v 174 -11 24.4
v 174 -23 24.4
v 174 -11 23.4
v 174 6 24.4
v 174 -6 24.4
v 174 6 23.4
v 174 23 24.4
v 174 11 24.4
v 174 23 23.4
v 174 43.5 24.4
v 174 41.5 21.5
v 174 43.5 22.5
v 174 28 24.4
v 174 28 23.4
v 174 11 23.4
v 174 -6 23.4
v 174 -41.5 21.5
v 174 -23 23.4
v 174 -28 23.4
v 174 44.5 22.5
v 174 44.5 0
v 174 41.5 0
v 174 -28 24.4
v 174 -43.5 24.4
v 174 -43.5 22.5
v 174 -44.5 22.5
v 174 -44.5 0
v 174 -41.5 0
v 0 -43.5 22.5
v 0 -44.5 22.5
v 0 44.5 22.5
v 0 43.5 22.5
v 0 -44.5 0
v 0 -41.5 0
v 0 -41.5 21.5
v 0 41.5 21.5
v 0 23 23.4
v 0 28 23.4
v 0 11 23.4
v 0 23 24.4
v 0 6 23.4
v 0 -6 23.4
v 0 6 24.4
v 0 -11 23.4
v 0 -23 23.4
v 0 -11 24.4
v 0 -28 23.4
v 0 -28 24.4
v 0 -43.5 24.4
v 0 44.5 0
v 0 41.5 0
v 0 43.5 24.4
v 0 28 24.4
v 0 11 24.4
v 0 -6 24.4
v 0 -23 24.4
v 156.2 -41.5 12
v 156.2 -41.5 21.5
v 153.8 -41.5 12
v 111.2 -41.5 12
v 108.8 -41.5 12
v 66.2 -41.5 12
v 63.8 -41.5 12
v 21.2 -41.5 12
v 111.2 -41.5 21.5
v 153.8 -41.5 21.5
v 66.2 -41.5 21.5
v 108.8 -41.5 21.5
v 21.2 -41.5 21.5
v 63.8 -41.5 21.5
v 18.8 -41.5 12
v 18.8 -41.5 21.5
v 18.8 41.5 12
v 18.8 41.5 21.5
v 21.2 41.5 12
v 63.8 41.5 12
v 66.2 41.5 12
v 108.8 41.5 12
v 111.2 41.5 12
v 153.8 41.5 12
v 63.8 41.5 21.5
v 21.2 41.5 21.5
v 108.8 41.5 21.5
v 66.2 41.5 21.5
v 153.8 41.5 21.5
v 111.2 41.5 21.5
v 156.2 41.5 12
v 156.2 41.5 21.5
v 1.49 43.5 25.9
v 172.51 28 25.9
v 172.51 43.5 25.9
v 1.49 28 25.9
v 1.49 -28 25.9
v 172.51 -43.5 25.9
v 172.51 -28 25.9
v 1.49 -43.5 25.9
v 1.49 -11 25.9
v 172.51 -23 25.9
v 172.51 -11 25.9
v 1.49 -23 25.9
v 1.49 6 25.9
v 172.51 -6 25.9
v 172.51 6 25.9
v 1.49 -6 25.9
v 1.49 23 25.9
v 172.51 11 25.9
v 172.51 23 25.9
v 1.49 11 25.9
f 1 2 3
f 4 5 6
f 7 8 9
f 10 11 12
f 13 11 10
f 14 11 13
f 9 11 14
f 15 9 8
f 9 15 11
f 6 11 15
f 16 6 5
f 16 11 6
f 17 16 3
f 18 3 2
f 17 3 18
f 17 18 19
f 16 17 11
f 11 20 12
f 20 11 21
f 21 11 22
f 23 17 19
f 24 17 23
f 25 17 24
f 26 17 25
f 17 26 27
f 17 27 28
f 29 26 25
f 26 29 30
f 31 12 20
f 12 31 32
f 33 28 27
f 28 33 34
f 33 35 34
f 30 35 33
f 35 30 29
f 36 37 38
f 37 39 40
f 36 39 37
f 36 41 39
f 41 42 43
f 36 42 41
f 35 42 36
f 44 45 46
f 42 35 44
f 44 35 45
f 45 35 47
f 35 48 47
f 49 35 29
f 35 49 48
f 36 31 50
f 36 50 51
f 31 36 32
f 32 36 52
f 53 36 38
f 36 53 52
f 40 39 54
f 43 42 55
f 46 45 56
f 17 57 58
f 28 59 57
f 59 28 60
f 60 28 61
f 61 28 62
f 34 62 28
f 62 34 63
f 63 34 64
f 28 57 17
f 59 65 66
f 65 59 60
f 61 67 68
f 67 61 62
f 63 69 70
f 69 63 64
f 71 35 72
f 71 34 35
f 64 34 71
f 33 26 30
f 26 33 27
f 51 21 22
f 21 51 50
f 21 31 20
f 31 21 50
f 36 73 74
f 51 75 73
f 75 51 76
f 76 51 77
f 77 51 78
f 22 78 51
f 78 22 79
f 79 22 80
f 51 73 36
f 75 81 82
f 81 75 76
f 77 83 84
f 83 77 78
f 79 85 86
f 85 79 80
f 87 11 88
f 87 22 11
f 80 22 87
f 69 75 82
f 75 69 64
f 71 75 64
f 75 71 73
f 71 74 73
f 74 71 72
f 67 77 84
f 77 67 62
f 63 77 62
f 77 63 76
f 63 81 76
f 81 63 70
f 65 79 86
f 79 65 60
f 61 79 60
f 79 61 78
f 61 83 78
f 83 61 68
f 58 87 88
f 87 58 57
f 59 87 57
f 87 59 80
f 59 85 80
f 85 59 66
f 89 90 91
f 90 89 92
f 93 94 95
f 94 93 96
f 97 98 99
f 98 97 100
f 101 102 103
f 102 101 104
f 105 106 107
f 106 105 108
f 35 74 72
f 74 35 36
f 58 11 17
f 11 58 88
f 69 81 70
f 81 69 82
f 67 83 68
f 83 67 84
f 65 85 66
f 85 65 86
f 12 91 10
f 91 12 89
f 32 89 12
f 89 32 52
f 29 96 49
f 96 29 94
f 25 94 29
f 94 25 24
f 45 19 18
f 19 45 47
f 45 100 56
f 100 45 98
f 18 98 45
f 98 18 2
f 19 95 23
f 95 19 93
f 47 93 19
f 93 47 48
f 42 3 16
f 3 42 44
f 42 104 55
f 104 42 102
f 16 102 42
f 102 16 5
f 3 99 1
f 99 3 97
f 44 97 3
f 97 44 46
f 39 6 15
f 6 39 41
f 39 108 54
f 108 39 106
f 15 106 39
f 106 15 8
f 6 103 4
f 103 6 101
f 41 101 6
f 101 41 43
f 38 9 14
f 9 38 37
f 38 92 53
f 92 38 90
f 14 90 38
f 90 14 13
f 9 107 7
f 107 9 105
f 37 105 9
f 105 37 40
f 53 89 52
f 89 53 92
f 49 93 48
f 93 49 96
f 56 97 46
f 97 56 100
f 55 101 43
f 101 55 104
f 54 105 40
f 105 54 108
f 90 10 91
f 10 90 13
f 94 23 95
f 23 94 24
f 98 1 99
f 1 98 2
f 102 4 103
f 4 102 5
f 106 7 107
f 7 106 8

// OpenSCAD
// file: machine_frame.scad
// =============================================
// Riftbound Card Sorter — shared machine frame
// =============================================
// Single source of truth for the card path after the Nov 11 redesign
// (suction pick from a motor-raised hopper, raised transport line,
// cradle shuttle sorter). Machine coords as in assembly.scad:
//   X = card travel (hopper -> belt -> tray), Y = across belt (+Y = back,
//   electronics side), Z = up, Z=0 bottom of baseplate tiles.
// `use <machine_frame.scad>` does not import variables, so read these via
// the functions at the bottom.
// =============================================

base_top   = 4;      // top of baseplate tiles
riser_h    = 60;     // conveyor deck raised so cards can FALL into both tray floors
deck_z     = base_top + riser_h;          // rail base / hopper deck reference = 64

// Conveyor (geometry unchanged, just lifted by riser_h)
belt_x0    = -165;   // belt start
belt_x1    = 85;     // belt end
roller_x   = [-140, 60];
rail_in    = 45;     // |Y| of rail inner faces
shaft_z    = deck_z + 15;
card_z     = deck_z + 15 + 11.9;          // top of round belts = card face = 90.9
scan_flat  = [-127, 47];                  // slide-bed backed flat zone (X)

// Scanner
cam_x      = 5;      // lens axis; card centred here for capture (moved from -40 so the hood clears the arm drop zone at X -139..-51)

// Hopper (motor-raised floor keeps top card at card_z)
hopper_x   = -215;   // cavity centre X (Y = 0)

// Baseplate extents (3x3 tiles of 190x180)
base_x     = [-285, 285];
base_y     = [-270, 270];

// Pick & place hand-off
drop_x     = -95;    // card CENTRE when the suction arm releases it onto the belt
                     // (card spans -139..-51: on belts, clear of hopper wall)
drop_clear = 3;      // card underside this far above belt at release (low drop)

// Sorting tray (bottom on baseplate); owner of tray placement may move it in X
tray_floor_lower_z = base_top + 2.5;      // lower slot floor
tray_floor_upper_z = base_top + 65 + 3 + 2.5;  // = 74.5 upper slot floor

// Card
card_w = 63; card_l = 88; card_t = 0.33;  // RAW cards (owner confirmed 2026-11-11: no sleeves), ~1.75 g

// MG996R mounting-tab holes (all three servos: pick arm ch0, shuttle ch1 / ch2).
// ONE value for every mount: hole-centre pitch along the case (49.5, TowerPro
// MG996R drawing) × across it (10), symmetric about the case centre. Clones
// vary (48.5..50 seen); the servo's own tab holes are Ø4.5+ grommet holes, so
// an M3 / M2.5 still lands for ±0.7 mm. MEASURE YOUR SERVO; if it is further
// off, change it here and re-export the arm head and the shuttle end post / riser.
mg996r_hole_pitch = 49.5;
mg996r_hole_dx    = 10;

function frame_base_top()  = base_top;
function frame_riser_h()   = riser_h;
function frame_deck_z()    = deck_z;
function frame_belt_x0()   = belt_x0;
function frame_belt_x1()   = belt_x1;
function frame_roller_x()  = roller_x;
function frame_rail_in()   = rail_in;
function frame_card_z()    = card_z;
function frame_scan_flat() = scan_flat;
function frame_cam_x()     = cam_x;
function frame_hopper_x()  = hopper_x;
function frame_base_x()    = base_x;
function frame_base_y()    = base_y;
function frame_drop_x()    = drop_x;
function frame_drop_clear()= drop_clear;
function frame_tray_floor_lower_z() = tray_floor_lower_z;
function frame_tray_floor_upper_z() = tray_floor_upper_z;
function frame_mg996r_hole_pitch() = mg996r_hole_pitch;
function frame_mg996r_hole_dx()    = mg996r_hole_dx;
// file: conveyor_roller.scad
// =============================================
// Riftbound Card Sorter — Conveyor Roller / Round-Belt Pulley
// =============================================
// Print 2× (one per 8mm rod: near x=-140 + far x=+60, both driven).
// Drive: N20 → 3mm-to-8mm set-screw coupling (motor_mount.scad) → 8mm rod
//        → this roller (D-bore keyed to the rod flat + M3 grub screw).
// The rollers are the pulleys of a 4-strand ROUND-BELT conveyor: four
// 135 × 3mm NBR O-rings run in the grooves and carry the card across the
// 200mm span between the rollers (slide_bed.scad sits under the top span).
// Material: PLA/PETG, 4 perimeters, 60% infill
//
// Local frame: roller axis = +Z, z = 0 at the front (-Y, motor-side) end.
// In assembly.scad: translate([x, -roller_w/2, 19]) rotate([-90,0,0]),
// so machine Y = z - 44.
// =============================================
//
// ── ROUND BELT (O-ring) MATH ────────────────────────────────────────────
//   Belt: NBR 70A O-ring, ID 135 × CS 3.0 (OD 141), 4 per machine.
//   Free centreline length  = π·(ID + CS) = π·138       = 433.5 mm
//   Stretched CS ≈ 3/√1.074 = 2.89 → cord centre rests at r = 10.45
//   Pitch dia Dp            = 2·10.45                    = 20.9 mm
//   Belt path (open, equal pulleys, C = 200) = 2C + π·Dp = 465.6 mm
//   Stretch                 = 465.6 / 433.5 − 1          = 7.4 %
//   Static tension ≈ E·ε·A ≈ 6 MPa·0.074·6.6 mm² ≈ 2.9 N per strand
//   Sag at mid-span: self weight (8.5 g/m) 0.14 mm + 1.8 g card 0.08 mm
//   → < 0.25 mm, irrelevant optically; slide bed added for robustness.
//   Belt top (card face) r = 10.45 + 1.45 = 11.9 → 0.9 mm above the
//   roller body, so the card only ever touches the belts.
// ────────────────────────────────────────────────────────────────────────

roller_dia  = 22;
roller_w    = 88;    // 90mm rail gap − 2 × 1.0mm running clearance
shaft_bore  = 8.2;   // clearance for 8mm steel rod (ream with 8mm bit)

// Round-belt grooves: R1.6 round bottom + 45° flanks to the OD (teardrop on
// both sides). The old U-groove (R1.6 + flanks parallel to the OD) put a flat
// ceiling over the cord when printed axis-vertical: the region flatter than
// 45° spanned r 9.47 → 11.0 = 1.53 mm, the last layer stepping out ≈ 1.2 mm in
// one go, right where the cord has only 0.15 mm side clearance — droop would
// pinch the belt. With 45° flanks nothing overhangs past 45°. The tensioned
// cord (r 1.45) seats in the R1.6 bottom, which centres it; at its equator
// (r 10.45) the groove is ±2.11, i.e. ≤ 0.66 mm free side play, and the
// mouth at the OD is 5.3 wide (lands 11.7 between strands).
belt_cs      = 3.0;                 // O-ring cross-section (free)
belt_y       = [-25.5, -8.5, 8.5, 25.5];   // strand centres, machine Y (17mm pitch)
groove_r     = 1.6;                 // bottom radius (free cord r 1.5 + 0.1)
groove_c     = 10.6;                // groove-circle centre radius → bottom at r 9.0
belt_pitch_r = 10.45;               // stretched cord centre radius (see math)
belt_top_r   = 11.9;                // card face radius

rod_dia      = 8;
motor_flat_w = 4;    // width of the flat ground along the 8mm rod
flat_clr     = 0.15; // radial clearance roller flat → rod flat
// distance from axis to the roller's flat face (3.61mm for a 4mm-wide flat)
flat_off     = sqrt(pow(rod_dia / 2, 2) - pow(motor_flat_w / 2, 2)) + flat_clr;

// Axial location: M3 heat-set insert (radial, mid-roller, on the flat side)
// + M3 × 6 cup-point grub screw onto the rod flat. Keeps the roller centred
// with 1.0mm to each rail inner face. (Rod itself is located by the two
// collars outside the bearings — see motor_mount.scad.)
grub_z       = roller_w / 2;   // between the two inner belts (±8.5)
grub_insert_d = 4.0;
grub_insert_l = 6.0;           // from the surface inward (insert 5.7 long)
grub_d       = 3.2;            // through to the flat

// 608 inner-race spacer: sits between each bearing's inner ring and the
// rod collar so the collar can never touch the (stationary) ZZ shield.
spacer_id    = 8.3;
spacer_od    = 11.0;           // < 608 inner-ring land Ø12.1
spacer_t     = 1.0;

function roller_width()        = roller_w;
function roller_belt_y()       = belt_y;
function roller_belt_pitch_r() = belt_pitch_r;
function roller_belt_top_r()   = belt_top_r;
function roller_belt_cs()      = 2 * (belt_top_r - belt_pitch_r);  // stretched CS 2.9
function race_spacer_t()       = spacer_t;

// D-shaped bore: round bore minus the key (material left on the flat side)
module d_bore(h)
    difference() {
        cylinder(d = shaft_bore, h = h, $fn = 48);
        translate([-shaft_bore, flat_off, -1])
            cube([2 * shaft_bore, shaft_bore, h + 2]);
    }

// Groove profile in the (r, z) half-plane: R1.6 circle + 45° tangent flanks
module groove_2d() {
    t  = groove_r / sqrt(2);                 // 45° tangent point offset (1.13)
    r0 = groove_c - t;                       // 9.47
    r1 = roller_dia / 2 + 1;                 // past the OD
    translate([groove_c, 0]) circle(r = groove_r, $fn = 32);
    polygon([[r0, -t], [r1, -t - (r1 - r0)], [r1, t + (r1 - r0)], [r0, t]]);
}

module roller() {
    difference() {
        cylinder(d = roller_dia, h = roller_w, $fn = 96);

        // D-bore keyed to the rod flat (flat face at +y = flat_off)
        translate([0, 0, -0.1]) d_bore(roller_w + 0.2);

        // Round-belt grooves (U profile: R1.6 circle + straight walls)
        for (y = belt_y)
            translate([0, 0, y + roller_w / 2])
                rotate_extrude($fn = 96) groove_2d();

        // Grub-screw insert hole (radial, through the flat side) + screw hole
        translate([0, roller_dia / 2 + 0.1, grub_z]) rotate([90, 0, 0]) {
            cylinder(d = grub_insert_d, h = grub_insert_l + 0.1, $fn = 24);
            cylinder(d = grub_d, h = roller_dia / 2, $fn = 24);
        }
    }
}

module race_spacer()
    difference() {
        cylinder(d = spacer_od, h = spacer_t, $fn = 48);
        translate([0, 0, -0.1]) cylinder(d = spacer_id, h = spacer_t + 0.2, $fn = 32);
    }

// Reference solid: one stretched O-ring strand (round cord) running over
// two pulleys c apart, in the XZ plane (x along travel, z up, y = 0 on the
// strand), pulley axes along Y at x = 0 and x = c.
module belt_strand(c = 200) {
    cr = roller_belt_cs() / 2;
    // full torus in each groove (the inner half coincides with the groove,
    // so it adds no false contact; bed ends are 13mm from the axes)
    for (x = [0, c])
        translate([x, 0, 0]) rotate([90, 0, 0])
            rotate_extrude($fn = 64)
                translate([belt_pitch_r, 0]) circle(r = cr, $fn = 24);
    for (z = [-belt_pitch_r, belt_pitch_r])
        translate([0, 0, z]) rotate([0, 90, 0])
            cylinder(r = cr, h = c, $fn = 24);
}

roller();
// translate([20, 0, 0]) race_spacer();   // print 4

// =============================================
// PRINT ORIENTATION: axis vertical (on end); spacer flat
// SUPPORTS: none (groove flanks are 45°, see the groove note; Ø4 radial hole bridges)
// POST-PROCESS: ream bore with an 8mm drill bit (keep the flat),
//   heat-set one M3 insert into the radial hole, flush with the surface.
// ROD: full-length flat, ~0.5mm deep / 4mm wide (or buy 8mm D-shaft) —
//   keys this roller and seats the coupling set screw.
// ASSEMBLY: slide roller on, centre it (1.0mm gap to each rail face),
//   tighten the M3 × 6 grub onto the flat. Fit 4 O-rings across both
//   rollers before the second rod goes in (or roll them on over the end).
// =============================================
// main file
// =============================================
// Riftbound Card Sorter — Conveyor Slide Bed
// =============================================
// Print 1×. Sits between the rails, between the two rollers, INSIDE the
// four O-ring belt loops (upper span above it, return span below it).
// The belts carry the card; this bed is a flat datum under the top span:
//   - each belt runs in a 5mm channel, 0.6mm above the channel floor
//     (never touches in normal running; catches a sagging/pressed belt)
//   - lands between the channels are 1.0mm below the card plane, so a
//     bowed card can dip at most 1.0mm — flat zone for the scanner
//     (camera axis X = frame_cam_x() = 5, hood X -49..59).
// Belt sag without the bed is already < 0.25mm (see conveyor_roller.scad);
// the bed is cheap insurance against O-ring stress relaxation and cards
// being pressed down by the suction arm.
//
// Shape: inverted U — top plate + two side skirts standing on the
// baseplate just inside the rails (|Y| 41.5..44.5, outside every belt),
// plus 4 cross ribs that stop 6mm above the return span. Open at both
// ends, so the O-rings slip over it lengthwise.
// Captured, no screws: rails ±0.5mm in Y, rollers ±2mm in X, belts above.
//
// Frame: x = 0 at machine X = -127 (13mm past the near roller axis),
// y = 0 on the belt axis, z = 0 on the riser deck = rail base (machine Z 64).
// Place: translate([slide_bed_x0(), 0, frame_deck_z()]) slide_bed();
// Material: PLA/PETG, 0.2mm, 3 walls, 20% infill
// =============================================

use <conveyor_rail.scad>
use <conveyor_roller.scad>
use <machine_frame.scad>

roller_c      = 200;                      // roller centre distance
end_clr       = 13;                       // bed end → roller axis
bed_len       = roller_c - 2 * end_clr;   // 174
bed_hw        = 44.5;                     // rail inner faces at ±45

shaft_z       = rail_shaft_y();           // 15
belt_y        = roller_belt_y();          // [-25.5, -8.5, 8.5, 25.5]
belt_cs       = roller_belt_cs();         // 2.9 (stretched)
card_z        = shaft_z + roller_belt_top_r();          // 26.9 (machine 30.9)
belt_bot_z    = card_z - belt_cs;                       // 24.0
return_top_z  = shaft_z - roller_belt_pitch_r() + belt_cs / 2;  // 6.0

land_drop     = 1.0;    // lands below the card plane
chan_clr      = 0.6;    // channel floor below the belt
chan_w        = 5.0;
land_z        = card_z - land_drop;                     // 25.9
chan_floor_z  = belt_bot_z - chan_clr;                  // 23.4
plate_z0      = chan_floor_z - 1.9;                     // 21.5
skirt_t       = 3.0;
rib_t         = 2.4;
rib_z0        = return_top_z + 6;                       // 12.0
rib_x         = [20, 65, 110, 155];

function slide_bed_x0()     = -127;                     // machine X of local x = 0
function slide_bed_card_z() = card_z;

echo(str("SLIDE BED: ", bed_len, " × ", 2 * bed_hw, " × ", land_z,
         " mm; card plane z=", card_z, " (machine ", card_z + frame_deck_z(), "); land z=", land_z,
         "; channel floor z=", chan_floor_z, "; belt bottom z=", belt_bot_z,
         "; return-span top z=", return_top_z, "; rib bottom z=", rib_z0));
assert(rib_z0 - return_top_z >= 3, "ribs too close to the return span");

module slide_bed() {
    difference() {
        union() {
            // Top plate. 1 mm narrower than the skirts' outer faces so its
            // corners sit inside the skirts (no collinear outline vertices →
            // the exported mesh is cleanly watertight); lands still reach |Y| 43.5
            translate([0, -(bed_hw - 1), plate_z0]) cube([bed_len, 2 * (bed_hw - 1), land_z - plate_z0]);
            // Side skirts (outside all belts, inside the rails)
            for (s = [-1, 1])
                translate([0, s > 0 ? bed_hw - skirt_t : -bed_hw, 0])
                    cube([bed_len, skirt_t, plate_z0 + 1]);
            // Cross ribs (stiffness), clear of the return span
            for (x = rib_x)
                translate([x - rib_t / 2, -bed_hw, rib_z0]) cube([rib_t, 2 * bed_hw, plate_z0 - rib_z0 + 1]);
        }
        // Belt channels, open at both ends
        for (y = belt_y)
            translate([-0.1, y - chan_w / 2, chan_floor_z]) cube([bed_len + 0.2, chan_w, 10]);
        // Chamfer the plate's top edges at both ends so a card edge can't catch
        for (x = [0, bed_len])
            translate([x, 0, land_z]) rotate([90, 0, 0])
                linear_extrude(2 * bed_hw + 1, center = true)
                    polygon([[-1.5, 0.01], [1.5, 0.01], [0, -1.5]]);
    }
}

slide_bed();

// =============================================
// PRINT ORIENTATION: upside down (lands on the bed) — gives the flattest
//   top surface; skirts and ribs point up. Footprint 174 × 89mm.
// SUPPORTS: none
// INSTALL: lay the bed between the rails, loop the 4 O-rings lengthwise
//   around it (one per channel), put both rollers inside the loop ends,
//   lift them to the bearing height and push the rods through.
// =============================================
